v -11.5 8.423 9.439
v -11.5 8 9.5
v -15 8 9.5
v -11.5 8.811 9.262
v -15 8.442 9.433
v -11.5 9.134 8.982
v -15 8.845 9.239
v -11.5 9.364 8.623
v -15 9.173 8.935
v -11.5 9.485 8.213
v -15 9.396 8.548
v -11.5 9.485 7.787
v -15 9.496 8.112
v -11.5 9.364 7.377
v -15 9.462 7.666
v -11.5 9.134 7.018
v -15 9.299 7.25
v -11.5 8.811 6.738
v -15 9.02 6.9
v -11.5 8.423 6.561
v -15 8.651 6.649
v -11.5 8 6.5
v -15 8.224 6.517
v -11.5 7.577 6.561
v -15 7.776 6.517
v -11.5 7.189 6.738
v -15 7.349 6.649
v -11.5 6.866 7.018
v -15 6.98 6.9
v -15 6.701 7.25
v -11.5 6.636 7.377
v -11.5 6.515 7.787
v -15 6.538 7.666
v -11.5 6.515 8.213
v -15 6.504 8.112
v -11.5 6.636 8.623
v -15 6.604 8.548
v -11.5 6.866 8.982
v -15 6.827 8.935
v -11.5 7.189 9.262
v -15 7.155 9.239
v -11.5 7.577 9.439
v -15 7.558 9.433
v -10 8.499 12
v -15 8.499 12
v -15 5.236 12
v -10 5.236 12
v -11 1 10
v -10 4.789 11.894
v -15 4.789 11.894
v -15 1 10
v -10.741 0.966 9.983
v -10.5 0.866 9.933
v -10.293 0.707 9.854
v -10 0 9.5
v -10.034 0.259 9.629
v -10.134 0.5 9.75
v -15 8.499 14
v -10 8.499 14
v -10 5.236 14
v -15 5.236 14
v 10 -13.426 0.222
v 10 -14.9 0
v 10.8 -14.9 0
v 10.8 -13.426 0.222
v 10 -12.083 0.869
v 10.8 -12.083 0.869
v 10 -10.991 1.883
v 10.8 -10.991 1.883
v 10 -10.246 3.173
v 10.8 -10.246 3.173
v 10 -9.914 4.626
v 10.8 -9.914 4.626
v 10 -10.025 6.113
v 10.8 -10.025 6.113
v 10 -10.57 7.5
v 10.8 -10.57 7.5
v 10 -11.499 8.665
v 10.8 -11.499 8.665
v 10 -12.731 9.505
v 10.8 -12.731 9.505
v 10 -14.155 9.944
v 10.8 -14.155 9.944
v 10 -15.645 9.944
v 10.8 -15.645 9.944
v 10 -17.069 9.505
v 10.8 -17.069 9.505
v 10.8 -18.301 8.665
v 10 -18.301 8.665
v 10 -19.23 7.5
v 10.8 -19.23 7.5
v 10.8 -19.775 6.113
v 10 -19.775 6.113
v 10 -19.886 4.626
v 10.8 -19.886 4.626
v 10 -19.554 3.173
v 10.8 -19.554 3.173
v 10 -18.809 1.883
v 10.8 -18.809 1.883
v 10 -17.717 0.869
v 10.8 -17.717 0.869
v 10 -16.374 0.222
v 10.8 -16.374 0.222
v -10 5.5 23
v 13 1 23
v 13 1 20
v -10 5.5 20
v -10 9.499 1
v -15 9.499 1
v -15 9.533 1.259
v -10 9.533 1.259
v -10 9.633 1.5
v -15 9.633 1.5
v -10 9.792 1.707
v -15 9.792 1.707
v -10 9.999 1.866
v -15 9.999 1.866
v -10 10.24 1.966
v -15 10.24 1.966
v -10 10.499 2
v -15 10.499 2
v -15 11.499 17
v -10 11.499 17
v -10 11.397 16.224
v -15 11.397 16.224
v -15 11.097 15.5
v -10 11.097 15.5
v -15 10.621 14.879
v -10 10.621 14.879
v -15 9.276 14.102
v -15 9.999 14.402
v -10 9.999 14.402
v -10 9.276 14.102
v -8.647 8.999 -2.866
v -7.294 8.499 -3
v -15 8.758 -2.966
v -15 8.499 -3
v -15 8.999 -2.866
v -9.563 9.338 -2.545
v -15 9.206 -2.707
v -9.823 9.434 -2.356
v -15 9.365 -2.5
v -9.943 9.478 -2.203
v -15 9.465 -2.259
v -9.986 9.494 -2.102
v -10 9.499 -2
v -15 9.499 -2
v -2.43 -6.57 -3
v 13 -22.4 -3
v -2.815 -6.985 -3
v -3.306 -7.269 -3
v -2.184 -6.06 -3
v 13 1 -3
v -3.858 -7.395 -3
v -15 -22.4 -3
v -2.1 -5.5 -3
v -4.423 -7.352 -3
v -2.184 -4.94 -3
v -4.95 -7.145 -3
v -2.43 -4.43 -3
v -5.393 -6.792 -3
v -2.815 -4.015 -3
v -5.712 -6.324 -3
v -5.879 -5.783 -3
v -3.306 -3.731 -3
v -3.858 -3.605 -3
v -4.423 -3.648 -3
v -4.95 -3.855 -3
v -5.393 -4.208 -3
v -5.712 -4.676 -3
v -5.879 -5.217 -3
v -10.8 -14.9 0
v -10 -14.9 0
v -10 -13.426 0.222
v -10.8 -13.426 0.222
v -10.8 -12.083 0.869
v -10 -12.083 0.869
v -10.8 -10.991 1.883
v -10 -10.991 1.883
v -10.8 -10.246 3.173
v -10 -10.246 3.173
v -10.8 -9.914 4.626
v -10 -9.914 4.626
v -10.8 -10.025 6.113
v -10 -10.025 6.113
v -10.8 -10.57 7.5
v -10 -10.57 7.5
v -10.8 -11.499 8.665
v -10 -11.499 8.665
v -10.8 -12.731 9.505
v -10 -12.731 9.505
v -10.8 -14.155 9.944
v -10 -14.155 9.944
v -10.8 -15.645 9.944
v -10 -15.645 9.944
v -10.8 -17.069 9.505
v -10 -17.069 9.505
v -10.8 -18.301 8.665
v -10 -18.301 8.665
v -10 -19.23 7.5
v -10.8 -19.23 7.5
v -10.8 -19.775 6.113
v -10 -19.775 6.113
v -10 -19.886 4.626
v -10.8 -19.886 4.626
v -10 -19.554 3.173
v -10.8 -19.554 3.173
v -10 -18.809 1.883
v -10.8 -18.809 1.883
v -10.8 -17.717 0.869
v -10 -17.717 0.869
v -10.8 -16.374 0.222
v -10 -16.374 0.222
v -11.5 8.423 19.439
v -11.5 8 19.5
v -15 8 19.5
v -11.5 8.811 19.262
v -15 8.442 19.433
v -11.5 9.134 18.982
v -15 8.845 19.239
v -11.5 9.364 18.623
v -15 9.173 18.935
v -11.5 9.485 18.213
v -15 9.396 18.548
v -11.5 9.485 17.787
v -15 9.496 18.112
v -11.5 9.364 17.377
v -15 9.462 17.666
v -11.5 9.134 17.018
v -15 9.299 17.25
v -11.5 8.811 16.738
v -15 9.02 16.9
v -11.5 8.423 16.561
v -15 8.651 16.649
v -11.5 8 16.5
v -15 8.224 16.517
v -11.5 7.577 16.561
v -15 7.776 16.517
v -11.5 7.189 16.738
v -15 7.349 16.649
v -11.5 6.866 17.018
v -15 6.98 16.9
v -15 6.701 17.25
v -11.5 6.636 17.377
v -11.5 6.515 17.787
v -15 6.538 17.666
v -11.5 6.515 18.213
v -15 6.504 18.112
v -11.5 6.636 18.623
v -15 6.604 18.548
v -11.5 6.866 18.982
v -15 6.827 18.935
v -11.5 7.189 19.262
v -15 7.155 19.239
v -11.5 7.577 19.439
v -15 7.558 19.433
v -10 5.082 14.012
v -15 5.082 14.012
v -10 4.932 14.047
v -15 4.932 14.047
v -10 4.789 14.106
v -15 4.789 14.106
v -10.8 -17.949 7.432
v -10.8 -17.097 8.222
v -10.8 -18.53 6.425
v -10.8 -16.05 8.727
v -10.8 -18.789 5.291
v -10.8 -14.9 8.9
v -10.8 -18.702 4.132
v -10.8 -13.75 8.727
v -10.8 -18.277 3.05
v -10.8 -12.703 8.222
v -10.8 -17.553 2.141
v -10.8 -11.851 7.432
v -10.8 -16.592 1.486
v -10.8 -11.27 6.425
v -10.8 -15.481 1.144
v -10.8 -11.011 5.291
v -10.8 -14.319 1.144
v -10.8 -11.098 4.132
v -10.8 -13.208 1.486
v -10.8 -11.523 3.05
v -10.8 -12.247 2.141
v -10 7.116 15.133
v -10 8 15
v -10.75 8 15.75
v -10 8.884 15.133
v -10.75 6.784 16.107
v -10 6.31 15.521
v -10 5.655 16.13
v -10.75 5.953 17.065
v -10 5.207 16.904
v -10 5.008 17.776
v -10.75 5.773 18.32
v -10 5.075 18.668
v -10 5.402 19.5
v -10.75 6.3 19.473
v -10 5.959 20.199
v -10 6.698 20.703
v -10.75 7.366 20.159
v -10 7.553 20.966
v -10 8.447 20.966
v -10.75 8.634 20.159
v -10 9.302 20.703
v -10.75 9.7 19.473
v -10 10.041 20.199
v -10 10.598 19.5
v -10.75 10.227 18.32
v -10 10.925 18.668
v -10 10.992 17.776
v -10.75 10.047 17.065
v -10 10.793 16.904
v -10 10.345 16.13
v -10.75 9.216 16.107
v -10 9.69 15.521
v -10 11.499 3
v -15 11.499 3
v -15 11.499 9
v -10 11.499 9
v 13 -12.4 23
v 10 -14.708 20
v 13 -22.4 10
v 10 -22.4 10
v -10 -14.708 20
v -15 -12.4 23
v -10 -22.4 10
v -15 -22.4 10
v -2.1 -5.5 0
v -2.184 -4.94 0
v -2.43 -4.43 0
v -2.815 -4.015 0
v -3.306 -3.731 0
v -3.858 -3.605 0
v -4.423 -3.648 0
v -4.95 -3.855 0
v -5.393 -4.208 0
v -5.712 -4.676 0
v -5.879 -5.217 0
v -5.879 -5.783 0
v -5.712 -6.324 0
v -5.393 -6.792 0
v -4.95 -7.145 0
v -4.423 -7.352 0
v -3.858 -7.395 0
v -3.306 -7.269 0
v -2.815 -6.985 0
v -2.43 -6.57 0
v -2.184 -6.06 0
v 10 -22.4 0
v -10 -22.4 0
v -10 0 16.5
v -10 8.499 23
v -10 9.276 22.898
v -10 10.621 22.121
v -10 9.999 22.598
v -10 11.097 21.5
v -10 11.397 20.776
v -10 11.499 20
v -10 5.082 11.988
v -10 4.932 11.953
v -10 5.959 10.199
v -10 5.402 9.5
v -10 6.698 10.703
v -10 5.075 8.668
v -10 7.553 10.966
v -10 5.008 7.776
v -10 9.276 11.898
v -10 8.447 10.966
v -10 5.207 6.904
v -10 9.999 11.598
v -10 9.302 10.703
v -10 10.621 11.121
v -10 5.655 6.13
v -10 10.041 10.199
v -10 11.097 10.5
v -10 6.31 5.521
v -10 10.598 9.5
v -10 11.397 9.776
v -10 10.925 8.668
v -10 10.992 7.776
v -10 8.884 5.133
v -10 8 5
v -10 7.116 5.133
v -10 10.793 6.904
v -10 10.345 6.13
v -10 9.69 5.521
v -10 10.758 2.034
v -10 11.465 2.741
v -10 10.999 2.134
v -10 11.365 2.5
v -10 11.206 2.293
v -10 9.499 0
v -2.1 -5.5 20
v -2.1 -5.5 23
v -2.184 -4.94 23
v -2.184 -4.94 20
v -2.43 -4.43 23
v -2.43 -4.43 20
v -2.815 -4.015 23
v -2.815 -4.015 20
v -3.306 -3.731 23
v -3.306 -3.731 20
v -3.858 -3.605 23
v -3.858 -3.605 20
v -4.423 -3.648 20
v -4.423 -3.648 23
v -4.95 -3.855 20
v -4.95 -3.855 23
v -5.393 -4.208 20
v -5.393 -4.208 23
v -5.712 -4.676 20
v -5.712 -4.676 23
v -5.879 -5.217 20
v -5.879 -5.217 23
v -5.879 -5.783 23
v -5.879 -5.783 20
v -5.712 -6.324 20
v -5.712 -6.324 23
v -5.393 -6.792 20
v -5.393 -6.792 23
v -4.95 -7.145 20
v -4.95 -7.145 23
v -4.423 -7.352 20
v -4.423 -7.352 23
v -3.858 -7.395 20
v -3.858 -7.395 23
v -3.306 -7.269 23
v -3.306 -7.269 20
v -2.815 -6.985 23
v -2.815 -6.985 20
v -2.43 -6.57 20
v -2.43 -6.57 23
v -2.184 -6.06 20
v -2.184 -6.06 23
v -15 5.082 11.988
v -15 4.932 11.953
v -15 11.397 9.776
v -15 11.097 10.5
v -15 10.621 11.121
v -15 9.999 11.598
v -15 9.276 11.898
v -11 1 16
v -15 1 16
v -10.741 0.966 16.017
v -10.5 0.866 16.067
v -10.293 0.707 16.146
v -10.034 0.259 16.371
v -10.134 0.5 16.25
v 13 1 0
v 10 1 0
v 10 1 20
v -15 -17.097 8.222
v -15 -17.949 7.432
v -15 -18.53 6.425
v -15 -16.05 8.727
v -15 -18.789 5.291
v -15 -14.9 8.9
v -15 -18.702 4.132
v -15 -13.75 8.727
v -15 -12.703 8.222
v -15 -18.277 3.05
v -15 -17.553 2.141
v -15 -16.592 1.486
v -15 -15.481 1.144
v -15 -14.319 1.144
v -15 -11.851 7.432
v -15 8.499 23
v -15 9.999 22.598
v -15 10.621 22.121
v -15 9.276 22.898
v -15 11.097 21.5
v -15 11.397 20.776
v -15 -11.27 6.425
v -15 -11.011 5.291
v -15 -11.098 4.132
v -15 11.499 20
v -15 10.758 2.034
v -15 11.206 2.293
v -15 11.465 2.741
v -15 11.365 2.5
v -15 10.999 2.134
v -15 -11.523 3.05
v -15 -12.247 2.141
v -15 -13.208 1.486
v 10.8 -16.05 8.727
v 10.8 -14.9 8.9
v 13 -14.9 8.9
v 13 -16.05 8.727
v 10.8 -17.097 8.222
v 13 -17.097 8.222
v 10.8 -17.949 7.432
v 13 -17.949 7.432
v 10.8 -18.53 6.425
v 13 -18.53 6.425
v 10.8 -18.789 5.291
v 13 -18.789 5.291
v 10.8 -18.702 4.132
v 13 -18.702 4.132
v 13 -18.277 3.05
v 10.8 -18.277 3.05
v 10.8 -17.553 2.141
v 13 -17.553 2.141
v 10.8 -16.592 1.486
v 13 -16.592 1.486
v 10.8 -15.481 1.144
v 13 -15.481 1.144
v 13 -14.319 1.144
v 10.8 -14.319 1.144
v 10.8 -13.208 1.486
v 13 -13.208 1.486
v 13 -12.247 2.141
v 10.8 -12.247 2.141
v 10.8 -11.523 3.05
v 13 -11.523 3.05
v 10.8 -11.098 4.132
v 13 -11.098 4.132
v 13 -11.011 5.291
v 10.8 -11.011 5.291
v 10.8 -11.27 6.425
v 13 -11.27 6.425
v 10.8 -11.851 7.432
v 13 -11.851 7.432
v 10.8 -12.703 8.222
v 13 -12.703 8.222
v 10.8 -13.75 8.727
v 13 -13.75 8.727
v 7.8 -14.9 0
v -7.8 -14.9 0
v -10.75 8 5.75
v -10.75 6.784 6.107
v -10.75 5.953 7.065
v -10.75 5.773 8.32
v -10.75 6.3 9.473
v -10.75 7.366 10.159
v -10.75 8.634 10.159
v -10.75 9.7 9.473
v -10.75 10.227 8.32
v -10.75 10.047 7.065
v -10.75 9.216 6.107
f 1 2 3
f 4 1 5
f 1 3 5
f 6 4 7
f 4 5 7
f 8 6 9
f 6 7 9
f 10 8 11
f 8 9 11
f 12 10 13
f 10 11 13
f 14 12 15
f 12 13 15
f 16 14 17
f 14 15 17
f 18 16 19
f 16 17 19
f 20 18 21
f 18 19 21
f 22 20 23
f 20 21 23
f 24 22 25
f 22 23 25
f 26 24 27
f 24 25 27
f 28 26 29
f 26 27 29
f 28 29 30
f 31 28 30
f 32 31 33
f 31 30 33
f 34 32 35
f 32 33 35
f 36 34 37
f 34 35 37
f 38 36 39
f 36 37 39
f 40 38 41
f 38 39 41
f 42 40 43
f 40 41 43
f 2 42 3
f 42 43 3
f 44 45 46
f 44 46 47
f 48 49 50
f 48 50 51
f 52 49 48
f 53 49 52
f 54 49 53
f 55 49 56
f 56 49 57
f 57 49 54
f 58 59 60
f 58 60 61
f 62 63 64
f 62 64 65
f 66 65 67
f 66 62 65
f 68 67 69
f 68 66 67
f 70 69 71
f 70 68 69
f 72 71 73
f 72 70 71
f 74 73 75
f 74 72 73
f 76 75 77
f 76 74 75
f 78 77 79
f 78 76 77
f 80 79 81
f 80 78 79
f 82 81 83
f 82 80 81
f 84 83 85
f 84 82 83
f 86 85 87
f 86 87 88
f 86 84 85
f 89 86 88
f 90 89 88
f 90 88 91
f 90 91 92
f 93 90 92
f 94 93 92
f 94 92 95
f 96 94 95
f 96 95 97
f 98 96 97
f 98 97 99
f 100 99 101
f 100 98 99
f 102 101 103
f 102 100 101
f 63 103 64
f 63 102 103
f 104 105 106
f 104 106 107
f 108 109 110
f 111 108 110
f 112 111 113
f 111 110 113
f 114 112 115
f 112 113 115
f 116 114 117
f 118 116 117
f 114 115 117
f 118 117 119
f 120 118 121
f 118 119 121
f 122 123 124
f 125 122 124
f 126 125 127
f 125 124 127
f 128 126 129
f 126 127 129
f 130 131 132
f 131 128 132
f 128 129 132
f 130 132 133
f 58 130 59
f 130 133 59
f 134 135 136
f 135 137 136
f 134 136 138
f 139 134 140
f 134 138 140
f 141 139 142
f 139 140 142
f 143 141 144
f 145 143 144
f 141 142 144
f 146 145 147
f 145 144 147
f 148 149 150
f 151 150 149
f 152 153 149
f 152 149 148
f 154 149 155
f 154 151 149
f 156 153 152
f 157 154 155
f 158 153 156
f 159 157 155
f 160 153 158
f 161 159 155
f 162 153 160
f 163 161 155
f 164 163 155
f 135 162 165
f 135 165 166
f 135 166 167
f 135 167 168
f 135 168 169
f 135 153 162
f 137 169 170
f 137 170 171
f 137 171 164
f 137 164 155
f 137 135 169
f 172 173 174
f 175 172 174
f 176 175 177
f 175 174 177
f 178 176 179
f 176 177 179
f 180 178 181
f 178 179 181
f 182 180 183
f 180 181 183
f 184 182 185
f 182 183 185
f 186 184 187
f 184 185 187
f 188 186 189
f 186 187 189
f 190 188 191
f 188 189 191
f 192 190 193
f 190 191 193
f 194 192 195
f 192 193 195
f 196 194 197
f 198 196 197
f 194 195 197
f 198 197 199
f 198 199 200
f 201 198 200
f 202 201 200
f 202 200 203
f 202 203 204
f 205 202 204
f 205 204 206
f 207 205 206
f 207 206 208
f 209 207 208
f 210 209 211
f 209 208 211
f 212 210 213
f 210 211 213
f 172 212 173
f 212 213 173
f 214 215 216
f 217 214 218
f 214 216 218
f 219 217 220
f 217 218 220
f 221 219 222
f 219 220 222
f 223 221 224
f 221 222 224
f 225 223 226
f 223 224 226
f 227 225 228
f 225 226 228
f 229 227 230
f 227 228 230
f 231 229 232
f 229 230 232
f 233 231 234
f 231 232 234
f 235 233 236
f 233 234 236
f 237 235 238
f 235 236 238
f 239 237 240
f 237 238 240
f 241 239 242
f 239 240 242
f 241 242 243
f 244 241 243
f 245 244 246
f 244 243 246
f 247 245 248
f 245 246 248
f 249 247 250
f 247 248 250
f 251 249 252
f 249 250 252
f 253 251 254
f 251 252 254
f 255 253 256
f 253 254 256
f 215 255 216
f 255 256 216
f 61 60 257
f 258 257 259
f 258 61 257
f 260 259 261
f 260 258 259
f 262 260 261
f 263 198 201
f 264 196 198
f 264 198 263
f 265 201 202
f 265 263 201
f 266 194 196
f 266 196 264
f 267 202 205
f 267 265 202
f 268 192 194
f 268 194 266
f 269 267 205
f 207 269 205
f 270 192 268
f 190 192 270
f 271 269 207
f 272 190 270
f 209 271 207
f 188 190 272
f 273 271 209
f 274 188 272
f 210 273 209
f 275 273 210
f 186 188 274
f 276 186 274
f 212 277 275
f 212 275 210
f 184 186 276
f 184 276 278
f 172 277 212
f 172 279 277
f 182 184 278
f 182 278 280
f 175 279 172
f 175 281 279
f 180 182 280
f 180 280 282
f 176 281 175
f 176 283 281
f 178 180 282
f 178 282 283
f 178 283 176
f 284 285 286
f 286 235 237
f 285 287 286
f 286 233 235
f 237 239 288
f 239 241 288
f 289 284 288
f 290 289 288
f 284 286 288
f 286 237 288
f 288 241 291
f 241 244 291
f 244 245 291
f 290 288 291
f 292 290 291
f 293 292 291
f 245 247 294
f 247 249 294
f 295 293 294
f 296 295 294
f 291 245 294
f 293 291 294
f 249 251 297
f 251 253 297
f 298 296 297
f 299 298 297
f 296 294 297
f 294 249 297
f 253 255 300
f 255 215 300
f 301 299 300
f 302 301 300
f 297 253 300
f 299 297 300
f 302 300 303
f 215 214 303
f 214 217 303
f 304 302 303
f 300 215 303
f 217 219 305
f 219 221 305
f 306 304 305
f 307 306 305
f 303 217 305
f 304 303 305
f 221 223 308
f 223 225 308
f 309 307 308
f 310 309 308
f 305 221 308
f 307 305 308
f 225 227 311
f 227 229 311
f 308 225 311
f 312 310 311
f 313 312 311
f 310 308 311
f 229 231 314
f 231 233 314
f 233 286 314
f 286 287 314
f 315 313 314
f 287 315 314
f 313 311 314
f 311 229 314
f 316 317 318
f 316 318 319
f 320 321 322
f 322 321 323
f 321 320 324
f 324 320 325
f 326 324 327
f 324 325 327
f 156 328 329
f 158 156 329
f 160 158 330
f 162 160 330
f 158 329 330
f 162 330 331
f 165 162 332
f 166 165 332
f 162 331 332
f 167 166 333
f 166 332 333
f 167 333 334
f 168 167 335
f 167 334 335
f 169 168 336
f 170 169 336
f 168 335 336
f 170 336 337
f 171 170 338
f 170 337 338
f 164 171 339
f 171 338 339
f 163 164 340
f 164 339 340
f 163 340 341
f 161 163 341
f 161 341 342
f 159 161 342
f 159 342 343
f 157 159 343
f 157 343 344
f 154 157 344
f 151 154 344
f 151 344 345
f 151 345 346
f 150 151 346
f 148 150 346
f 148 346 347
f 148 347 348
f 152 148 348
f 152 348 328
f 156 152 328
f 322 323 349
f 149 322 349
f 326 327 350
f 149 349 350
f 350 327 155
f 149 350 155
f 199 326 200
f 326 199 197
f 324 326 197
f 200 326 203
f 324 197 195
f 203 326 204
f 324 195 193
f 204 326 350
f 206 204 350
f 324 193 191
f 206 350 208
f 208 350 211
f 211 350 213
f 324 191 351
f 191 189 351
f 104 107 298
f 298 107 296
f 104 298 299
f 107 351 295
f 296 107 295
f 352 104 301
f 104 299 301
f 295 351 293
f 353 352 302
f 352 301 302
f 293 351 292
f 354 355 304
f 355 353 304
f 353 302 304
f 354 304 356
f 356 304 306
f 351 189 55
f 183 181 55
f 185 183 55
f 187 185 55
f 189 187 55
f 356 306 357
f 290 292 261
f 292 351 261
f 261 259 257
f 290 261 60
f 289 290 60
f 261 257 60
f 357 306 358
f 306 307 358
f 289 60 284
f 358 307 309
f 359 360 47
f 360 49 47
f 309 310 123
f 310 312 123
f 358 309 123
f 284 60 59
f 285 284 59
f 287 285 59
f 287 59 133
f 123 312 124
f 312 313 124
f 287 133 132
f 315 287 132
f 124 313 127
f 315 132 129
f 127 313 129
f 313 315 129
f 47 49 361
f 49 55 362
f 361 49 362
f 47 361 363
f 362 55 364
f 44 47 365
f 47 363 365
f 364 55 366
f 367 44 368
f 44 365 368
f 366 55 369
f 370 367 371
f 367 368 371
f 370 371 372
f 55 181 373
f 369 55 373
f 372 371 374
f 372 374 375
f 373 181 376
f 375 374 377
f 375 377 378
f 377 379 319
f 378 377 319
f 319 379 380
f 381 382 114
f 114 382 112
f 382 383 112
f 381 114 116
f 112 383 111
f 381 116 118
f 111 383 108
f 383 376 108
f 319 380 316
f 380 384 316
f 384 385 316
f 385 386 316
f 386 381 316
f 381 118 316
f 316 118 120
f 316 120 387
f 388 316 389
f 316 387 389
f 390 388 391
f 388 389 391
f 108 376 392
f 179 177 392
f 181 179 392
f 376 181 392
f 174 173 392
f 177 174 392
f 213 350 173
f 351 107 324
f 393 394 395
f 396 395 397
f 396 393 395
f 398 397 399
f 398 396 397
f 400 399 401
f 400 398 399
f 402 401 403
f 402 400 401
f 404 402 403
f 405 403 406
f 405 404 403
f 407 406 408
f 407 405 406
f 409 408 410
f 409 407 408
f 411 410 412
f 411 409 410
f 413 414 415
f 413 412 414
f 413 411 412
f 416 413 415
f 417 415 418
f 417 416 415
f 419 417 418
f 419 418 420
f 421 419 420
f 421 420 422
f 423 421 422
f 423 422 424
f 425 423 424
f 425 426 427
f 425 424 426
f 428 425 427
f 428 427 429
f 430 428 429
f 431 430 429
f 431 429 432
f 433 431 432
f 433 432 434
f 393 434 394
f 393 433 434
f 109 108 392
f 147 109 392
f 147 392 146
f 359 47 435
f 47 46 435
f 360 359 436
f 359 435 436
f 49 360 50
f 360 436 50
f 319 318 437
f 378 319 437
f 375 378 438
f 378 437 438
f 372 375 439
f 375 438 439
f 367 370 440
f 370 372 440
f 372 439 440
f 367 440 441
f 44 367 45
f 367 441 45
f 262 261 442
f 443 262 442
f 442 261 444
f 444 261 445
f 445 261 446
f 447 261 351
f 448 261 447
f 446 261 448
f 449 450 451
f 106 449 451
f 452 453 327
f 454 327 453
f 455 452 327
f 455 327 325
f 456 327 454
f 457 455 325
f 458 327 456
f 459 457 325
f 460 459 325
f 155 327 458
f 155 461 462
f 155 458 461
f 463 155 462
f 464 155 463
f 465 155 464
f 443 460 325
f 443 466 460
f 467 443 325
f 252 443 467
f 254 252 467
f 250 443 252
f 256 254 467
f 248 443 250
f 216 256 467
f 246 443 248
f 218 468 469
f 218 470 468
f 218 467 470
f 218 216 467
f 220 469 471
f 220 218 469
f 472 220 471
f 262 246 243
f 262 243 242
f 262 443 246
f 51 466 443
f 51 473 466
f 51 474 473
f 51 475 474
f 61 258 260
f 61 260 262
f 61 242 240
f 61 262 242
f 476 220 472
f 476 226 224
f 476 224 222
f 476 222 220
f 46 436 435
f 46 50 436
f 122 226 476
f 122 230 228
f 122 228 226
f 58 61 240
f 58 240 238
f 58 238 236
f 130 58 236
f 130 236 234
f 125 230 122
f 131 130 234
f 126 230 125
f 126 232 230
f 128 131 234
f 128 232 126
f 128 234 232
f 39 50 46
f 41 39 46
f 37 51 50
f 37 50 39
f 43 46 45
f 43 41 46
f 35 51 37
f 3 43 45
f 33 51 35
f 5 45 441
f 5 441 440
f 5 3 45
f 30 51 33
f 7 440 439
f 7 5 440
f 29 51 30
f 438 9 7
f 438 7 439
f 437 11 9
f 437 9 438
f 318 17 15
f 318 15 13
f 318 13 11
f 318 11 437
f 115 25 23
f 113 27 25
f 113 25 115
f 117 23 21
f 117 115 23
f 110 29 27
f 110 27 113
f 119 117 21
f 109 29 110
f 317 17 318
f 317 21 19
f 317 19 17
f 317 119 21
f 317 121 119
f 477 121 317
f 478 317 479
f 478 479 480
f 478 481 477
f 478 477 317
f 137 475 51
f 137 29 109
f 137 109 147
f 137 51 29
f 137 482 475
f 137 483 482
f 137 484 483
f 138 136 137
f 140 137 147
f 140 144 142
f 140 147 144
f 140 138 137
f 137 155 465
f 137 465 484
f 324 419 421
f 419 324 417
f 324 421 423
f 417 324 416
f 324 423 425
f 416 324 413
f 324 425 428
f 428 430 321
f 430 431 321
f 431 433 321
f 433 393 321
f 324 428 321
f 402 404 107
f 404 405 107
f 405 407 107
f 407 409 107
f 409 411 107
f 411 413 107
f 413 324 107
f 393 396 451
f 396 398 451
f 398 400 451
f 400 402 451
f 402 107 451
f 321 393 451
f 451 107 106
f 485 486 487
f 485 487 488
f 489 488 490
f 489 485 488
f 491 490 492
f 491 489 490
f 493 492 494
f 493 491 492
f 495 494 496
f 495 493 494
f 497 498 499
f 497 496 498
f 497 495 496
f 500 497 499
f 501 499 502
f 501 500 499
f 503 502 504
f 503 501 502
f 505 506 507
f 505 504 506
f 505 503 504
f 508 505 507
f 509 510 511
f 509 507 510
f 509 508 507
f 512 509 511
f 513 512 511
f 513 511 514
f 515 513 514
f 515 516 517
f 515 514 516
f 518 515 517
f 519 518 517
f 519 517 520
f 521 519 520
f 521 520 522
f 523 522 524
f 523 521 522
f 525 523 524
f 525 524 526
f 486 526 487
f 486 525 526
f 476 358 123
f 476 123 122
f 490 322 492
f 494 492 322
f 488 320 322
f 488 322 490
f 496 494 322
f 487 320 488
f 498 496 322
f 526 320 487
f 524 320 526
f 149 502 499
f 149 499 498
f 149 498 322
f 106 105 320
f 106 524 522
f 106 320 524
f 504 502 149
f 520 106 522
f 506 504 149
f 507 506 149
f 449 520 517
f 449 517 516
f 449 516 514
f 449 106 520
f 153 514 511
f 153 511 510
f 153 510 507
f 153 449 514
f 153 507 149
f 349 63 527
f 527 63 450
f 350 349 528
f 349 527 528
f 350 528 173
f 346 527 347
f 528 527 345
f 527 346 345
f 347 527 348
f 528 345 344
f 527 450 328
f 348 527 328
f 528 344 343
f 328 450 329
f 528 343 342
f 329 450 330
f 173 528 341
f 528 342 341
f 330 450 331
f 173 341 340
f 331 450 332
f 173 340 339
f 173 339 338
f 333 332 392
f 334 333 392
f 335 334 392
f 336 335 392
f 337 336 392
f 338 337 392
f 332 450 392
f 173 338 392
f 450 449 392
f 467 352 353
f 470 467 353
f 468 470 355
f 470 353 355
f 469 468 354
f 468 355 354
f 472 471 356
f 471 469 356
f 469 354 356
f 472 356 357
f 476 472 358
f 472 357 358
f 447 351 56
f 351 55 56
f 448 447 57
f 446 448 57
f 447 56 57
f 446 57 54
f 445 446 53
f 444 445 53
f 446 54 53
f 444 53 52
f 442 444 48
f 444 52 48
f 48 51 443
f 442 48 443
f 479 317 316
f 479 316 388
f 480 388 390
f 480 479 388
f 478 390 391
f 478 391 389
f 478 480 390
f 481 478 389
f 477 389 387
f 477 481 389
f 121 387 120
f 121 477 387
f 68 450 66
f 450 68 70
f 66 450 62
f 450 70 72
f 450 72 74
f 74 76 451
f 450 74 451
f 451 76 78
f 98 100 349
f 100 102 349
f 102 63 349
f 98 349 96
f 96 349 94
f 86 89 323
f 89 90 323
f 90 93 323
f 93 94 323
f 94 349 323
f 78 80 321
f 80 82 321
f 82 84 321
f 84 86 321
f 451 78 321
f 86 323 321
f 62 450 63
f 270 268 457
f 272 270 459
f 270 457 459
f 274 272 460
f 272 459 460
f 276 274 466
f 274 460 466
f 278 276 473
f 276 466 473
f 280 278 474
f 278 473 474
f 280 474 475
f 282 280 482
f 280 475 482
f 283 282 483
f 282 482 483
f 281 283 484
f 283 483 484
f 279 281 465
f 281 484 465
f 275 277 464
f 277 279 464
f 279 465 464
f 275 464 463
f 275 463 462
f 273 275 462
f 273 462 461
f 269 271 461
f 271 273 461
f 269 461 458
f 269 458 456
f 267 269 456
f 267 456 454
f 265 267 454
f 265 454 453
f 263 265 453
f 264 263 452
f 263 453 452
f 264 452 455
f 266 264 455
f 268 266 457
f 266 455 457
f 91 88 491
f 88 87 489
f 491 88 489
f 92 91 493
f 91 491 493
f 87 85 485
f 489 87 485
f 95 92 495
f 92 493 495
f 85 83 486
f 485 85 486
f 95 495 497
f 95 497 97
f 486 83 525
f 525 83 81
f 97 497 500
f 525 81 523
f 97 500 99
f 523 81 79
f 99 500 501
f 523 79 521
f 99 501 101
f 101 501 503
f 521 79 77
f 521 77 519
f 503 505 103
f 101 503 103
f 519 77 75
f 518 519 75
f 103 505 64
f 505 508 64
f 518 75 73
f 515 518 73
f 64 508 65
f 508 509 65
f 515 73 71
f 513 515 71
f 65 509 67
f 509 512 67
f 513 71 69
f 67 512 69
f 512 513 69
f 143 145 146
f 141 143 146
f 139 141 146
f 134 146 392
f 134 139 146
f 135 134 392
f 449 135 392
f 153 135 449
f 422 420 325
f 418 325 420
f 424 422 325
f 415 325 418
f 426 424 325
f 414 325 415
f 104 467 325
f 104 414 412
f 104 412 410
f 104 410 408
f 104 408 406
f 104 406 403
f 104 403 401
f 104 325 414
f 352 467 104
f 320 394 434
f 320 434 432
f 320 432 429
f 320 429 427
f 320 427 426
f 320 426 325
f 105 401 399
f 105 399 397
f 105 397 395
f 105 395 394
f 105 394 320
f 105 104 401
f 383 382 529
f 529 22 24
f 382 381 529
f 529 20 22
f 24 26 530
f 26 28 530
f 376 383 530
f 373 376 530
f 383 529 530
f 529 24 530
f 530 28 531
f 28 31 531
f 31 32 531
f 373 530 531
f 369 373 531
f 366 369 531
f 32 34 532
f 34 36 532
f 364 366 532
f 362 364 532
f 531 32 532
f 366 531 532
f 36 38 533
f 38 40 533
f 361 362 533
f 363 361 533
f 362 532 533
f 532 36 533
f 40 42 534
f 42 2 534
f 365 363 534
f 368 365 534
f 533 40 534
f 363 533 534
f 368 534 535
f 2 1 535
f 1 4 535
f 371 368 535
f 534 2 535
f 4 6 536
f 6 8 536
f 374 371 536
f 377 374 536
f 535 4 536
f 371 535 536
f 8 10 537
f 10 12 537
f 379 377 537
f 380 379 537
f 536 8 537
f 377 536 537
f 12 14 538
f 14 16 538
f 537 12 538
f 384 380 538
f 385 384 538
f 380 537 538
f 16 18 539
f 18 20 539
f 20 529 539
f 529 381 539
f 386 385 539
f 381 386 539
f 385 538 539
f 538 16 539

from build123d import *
from build123d.topology import SkipClean

# Parameters (mm, degrees)
SKETCH_1_W                = 20
SKETCH_1_H                = 57.76596942167697
EXTRUDE_1_DEPTH           = 3
EXTRUDE_2_DEPTH           = 3
CUT_EXTRUDE_1_DEPTH       = 6
SKETCH_8_R                = 4.48
CUT_EXTRUDE_2_DEPTH       = 0.8
SKETCH_9_R                = 1.9
CUT_EXTRUDE_3_DEPTH       = 3.8
SKETCH_12_W               = 26.000000000000007
SKETCH_12_H               = 35.36596942167698
CUT_EXTRUDE_4_DEPTH       = 36.00000000000001
CUT_EXTRUDE_8_DEPTH       = 28.00000000000001
SKETCH_23_W               = 26.000000000000004
SKETCH_23_H               = 26
SKETCH_23_W_2             = 20
SKETCH_23_H_2             = 19.999999999999993
EXTRUDE_7_DEPTH           = 4
SKETCH_24_W               = 20
SKETCH_24_H               = 19.999999999999993
EXTRUDE_8_DEPTH           = 3
SKETCH_25_W               = 5.000000000000002
SKETCH_25_H               = 16
SKETCH_25_R               = 1.4999999999999991
EXTRUDE_9_DEPTH           = 3
FILLET_1_R                = 1
CUT_EXTRUDE_9_DEPTH       = 3
SKETCH_27_R               = 1.4999999999999987
CUT_EXTRUDE_10_DEPTH      = 3
SKETCH_28_W               = 20
SKETCH_28_H               = 19.999999999999993
CUT_EXTRUDE_11_DEPTH      = 10
CUT_EXTRUDE_12_DEPTH      = 42.00000000000001
SKETCH_31_R               = 4.48
SKETCH_31_R_2             = 3.98
EXTRUDE_13_DEPTH          = 0.8
SKETCH_32_R               = 5.000000000000001
SKETCH_32_R_2             = 3.98
CUT_EXTRUDE_13_DEPTH      = 0.8
SKETCH_33_R               = 4.48
EXTRUDE_14_DEPTH          = 3
SKETCH_36_R               = 5.000000000000001
CUT_EXTRUDE_14_DEPTH      = 3
SKETCH_37_R               = 3.98
SKETCH_37_R_2             = 3.900000000000001
EXTRUDE_17_DEPTH          = 0.8
SKETCH_38_R               = 1.5000000000000009
EXTRUDE_18_DEPTH          = 3
SKETCH_39_W               = 4.187599959799879
SKETCH_39_H               = 1.3608825238343043
EXTRUDE_19_DEPTH          = 3
EXTRUDE_START             = 2
SKETCH_43_R               = 1.5000000000000024
SKETCH_43_R_2             = 1.5000000000000009
SKETCH_43_R_3             = 3.900000000000002
EXTRUDE_22_DEPTH          = 2
SKETCH_44_W               = 5
SKETCH_44_H               = 9.399224841629362
EXTRUDE_23_DEPTH          = 2
EXTRUDE_24_DEPTH          = 3
SKETCH_47_W               = 5
SKETCH_47_H               = 9.399224841629362
EXTRUDE_25_DEPTH          = 8
SKETCH_51_W               = 5
SKETCH_51_H               = 14
SKETCH_51_H_2             = 7.999999999999998
EXTRUDE_28_DEPTH          = 1.1
CUT_EXTRUDE_16_DEPTH      = 6.1000000000000005
FILLET_START              = -16
FILLET_9_DEPTH            = 7
FILLET_START_2            = -15
FILLET_9_2_DEPTH          = 5
EXTRUDE_30_DEPTH          = 3
FILLET_10_R               = 1
SKETCH_57_W               = 5
SKETCH_57_H               = 10.499224841629362
EXTRUDE_31_DEPTH          = 1
SKETCH_58_W               = 5
SKETCH_58_H               = 10.499224841629362
EXTRUDE_32_DEPTH          = 1
FILLET_11_R               = 3
CUT_EXTRUDE_19_DEPTH      = 6.500000000000001
FILLET_14_R               = 1
FILLET_19_R               = 1
HOLE_WIZARD_1_D           = 3
HOLE_WIZARD_1_DEPTH       = 5
HOLE_WIZARD_1_CSINK_D     = 6
HOLE_WIZARD_1_CSINK_ANGLE = 90


with BuildPart() as part:
    # 草图1 → 凸台-拉伸1 (new body)
    with BuildSketch(Plane.XY):
        with Locations((0, -28.882984710838485)):
            Rectangle(SKETCH_1_W, SKETCH_1_H)
    extrude_1 = extrude(amount=-EXTRUDE_1_DEPTH)

    # 草图2 → 凸台-拉伸2 (add)
    with BuildSketch(Plane.ZY.offset(10)):
        Polygon((-3, -1.22e-15), (23, 0), (23.000000000000007, -57.76596942167697), (-3, -57.76596942167697), align=None)
    extrude_2 = extrude(amount=EXTRUDE_2_DEPTH)

    # 草图7 → 切除-拉伸1 (cut)
    with BuildSketch(Plane(origin=(-10, 0, 0), x_dir=(0, 0, -1), z_dir=(1, 0, 0))):
        with BuildLine():
            ThreePointArc((-1.0999999999999996, -14.899999999999997), (-5, -10.999999999999996), (-8.9, -14.899999999999997))
            Line((-8.9, -14.899999999999997), (-1.1000000000000014, -14.899999999999997))
        make_face()
        with BuildLine():
            Line((-1.1000000000000014, -14.899999999999997), (-8.9, -14.899999999999997))
            ThreePointArc((-8.9, -14.899999999999997), (-5.000000000000001, -18.799999999999997), (-1.0999999999999996, -14.899999999999999))
        make_face()
    cut_extrude_1 = extrude(amount=-CUT_EXTRUDE_1_DEPTH, mode=Mode.SUBTRACT)

    # 草图8 → 切除-拉伸2 (cut)
    with BuildSketch(Plane.ZY.offset(13.000000000000002)):
        with Locations((5, -14.899999999999997)):
            Circle(SKETCH_8_R)
    cut_extrude_2 = extrude(amount=-CUT_EXTRUDE_2_DEPTH, mode=Mode.SUBTRACT)

    # 草图9 → 切除-拉伸3 (cut)
    with BuildSketch(Plane.XY):
        with Locations((-4, -5.499999999999998)):
            Circle(SKETCH_9_R)
    cut_extrude_3 = extrude(amount=-CUT_EXTRUDE_3_DEPTH, mode=Mode.SUBTRACT)

    # 镜向1: 凸台-拉伸2 across plane
    add(extrude_2.mirror(Plane(origin=(0, 0, 0), x_dir=(0, 0, 1), z_dir=(1, 0, 0))))

    # 镜向2: 切除-拉伸1, 切除-拉伸2 across plane
    add(cut_extrude_1.mirror(Plane(origin=(0, 0, 0), x_dir=(0, 0, 1), z_dir=(1, 0, 0))), mode=Mode.SUBTRACT)
    add(cut_extrude_2.mirror(Plane(origin=(0, 0, 0), x_dir=(0, 0, 1), z_dir=(1, 0, 0))), mode=Mode.SUBTRACT)

    # 镜向3: 凸台-拉伸1 across plane
    add(extrude_1.mirror(Plane.XY.offset(10)))

    # 镜向5: 切除-拉伸3 across plane
    add(cut_extrude_3.mirror(Plane.XY.offset(10)), mode=Mode.SUBTRACT)

    # 草图12 → 切除-拉伸4 (cut)
    with BuildSketch(Plane(origin=(13.000000000000002, 0, 0), x_dir=(0, 0, -1), z_dir=(1, 0, 0))):
        with Locations((-10.000000000000004, -40.08298471083848)):
            Rectangle(SKETCH_12_W, SKETCH_12_H)
    extrude(amount=-CUT_EXTRUDE_4_DEPTH, mode=Mode.SUBTRACT)

    # 草图22 → 切除-拉伸8 (cut)
    with BuildSketch(Plane(origin=(13.000000000000002, 0, 0), x_dir=(0, 0, -1), z_dir=(1, 0, 0))):
        Polygon((-23.000000000000007, -12.399999999999997), (-23.000000000000007, -22.399999999999995), (-10.000000000000007, -22.399999999999995), align=None)
    extrude(amount=-CUT_EXTRUDE_8_DEPTH, mode=Mode.SUBTRACT)

    # 草图23 → 凸台-拉伸7 (add)
    with BuildSketch(Plane(origin=(0, 0, 0), x_dir=(1, 0, 0), z_dir=(0, 1, 0))):
        with Locations((0, -10)):
            Rectangle(SKETCH_23_W, SKETCH_23_H)
        with Locations((0, -9.999999999999996)):
            Rectangle(SKETCH_23_W_2, SKETCH_23_H_2, mode=Mode.SUBTRACT)
    extrude(amount=EXTRUDE_7_DEPTH)

    # 草图24 → 凸台-拉伸8 (add)
    with BuildSketch(Plane(origin=(0, 4, 0), x_dir=(1, 0, 0), z_dir=(0, 1, 0))):
        with Locations((0, -9.999999999999996)):
            Rectangle(SKETCH_24_W, SKETCH_24_H)
    extrude(amount=-EXTRUDE_8_DEPTH)

    # 草图25 → 凸台-拉伸9 (add)
    with BuildSketch(Plane(origin=(0, 4, 0), x_dir=(1, 0, 0), z_dir=(0, 1, 0))):
        with Locations((15.500000000000004, -15)):
            Rectangle(SKETCH_25_W, SKETCH_25_H)
        with Locations(Location((15.500000000000002, -20.23329325648959, 0), (0, 0, 270))):
            Circle(SKETCH_25_R, mode=Mode.SUBTRACT)
        with Locations(Location((15.500000000000002, -10.23329325648959, 0), (0, 0, 270))):
            Circle(SKETCH_25_R, mode=Mode.SUBTRACT)
    extrude(amount=-EXTRUDE_9_DEPTH)

    # 圆角1
    fillet_1_edges = [part.edges().sort_by_distance(p)[0] for p in [
        (18.000000000000004, 1, 15),
    ]]
    fillet(fillet_1_edges, radius=FILLET_1_R)

    # 草图26 → 切除-拉伸9 (cut)
    with BuildSketch(Plane(origin=(13.000000000000002, 0, 0), x_dir=(0, 0, -1), z_dir=(1, 0, 0))):
        with BuildLine():
            Line((-16, 1.0000000000000004), (-13.999999999999998, 1.0000000000000004))
            ThreePointArc((-13.999999999999998, 1.0000000000000004), (-15, 0), (-16, 1.0000000000000004))
        make_face()
    extrude(amount=-CUT_EXTRUDE_9_DEPTH, mode=Mode.SUBTRACT)

    # 草图27 → 切除-拉伸10 (cut)
    with BuildSketch(Plane(origin=(0, 4, 0), x_dir=(1, 0, 0), z_dir=(0, 1, 0))):
        with Locations(Location((7.500000000000002, -15.233293256489592, 0), (0, 0, 270))):
            Circle(SKETCH_27_R)
    extrude(amount=-CUT_EXTRUDE_10_DEPTH, mode=Mode.SUBTRACT)

    # 草图28 → 切除-拉伸11 (cut)
    with BuildSketch(Plane.XZ.offset(-1)):
        with Locations((0, 9.999999999999996)):
            Rectangle(SKETCH_28_W, SKETCH_28_H)
    extrude(amount=-CUT_EXTRUDE_11_DEPTH, mode=Mode.SUBTRACT)

    # 草图29 → 切除-拉伸12 (cut)
    with BuildSketch(Plane(origin=(0, 0, -3), x_dir=(-1, 0, 0), z_dir=(0, 0, -1))):
        Polygon((13.000000000000002, 4), (-24.68163228941081, 4), (-24.68163228941081, 0.9999999999999957), (13.000000000000002, 1.0000000000000002), align=None)
    extrude(amount=-CUT_EXTRUDE_12_DEPTH, mode=Mode.SUBTRACT)

    # 草图31 → 凸台-拉伸13 (add)
    with BuildSketch(Plane.ZY.offset(12.200000000000001)):
        with Locations((5, -14.899999999999997)):
            Circle(SKETCH_31_R)
        with Locations((5, -14.899999999999997)):
            Circle(SKETCH_31_R_2, mode=Mode.SUBTRACT)
    extrude(amount=EXTRUDE_13_DEPTH)

    # 草图32 → 切除-拉伸13 (cut)
    with BuildSketch(Plane(origin=(-10, 0, 0), x_dir=(0, 0, -1), z_dir=(1, 0, 0))):
        with Locations((-5, -14.899999999999997)):
            Circle(SKETCH_32_R)
        with Locations(Location((-5, -14.899999999999997, 0), (0, 0, 180))):
            Circle(SKETCH_32_R_2, mode=Mode.SUBTRACT)
    cut_extrude_13 = extrude(amount=-CUT_EXTRUDE_13_DEPTH, mode=Mode.SUBTRACT)

    # 草图33 → 凸台-拉伸14 (add)
    with BuildSketch(Plane(origin=(13.000000000000002, 0, 0), x_dir=(0, 0, -1), z_dir=(1, 0, 0))):
        with Locations((-5, -14.899999999999997)):
            Circle(SKETCH_33_R)
    extrude(amount=-EXTRUDE_14_DEPTH)

    # 镜向6: 切除-拉伸1, 切除-拉伸13 across plane
    add(cut_extrude_1.mirror(Plane(origin=(0, 0, 0), x_dir=(0, 0, 1), z_dir=(1, 0, 0))), mode=Mode.SUBTRACT)
    add(cut_extrude_13.mirror(Plane(origin=(0, 0, 0), x_dir=(0, 0, 1), z_dir=(1, 0, 0))), mode=Mode.SUBTRACT)

    # 草图36 → 切除-拉伸14 (cut)
    with BuildSketch(Plane(origin=(-10.8, 0, 0), x_dir=(0, 0, -1), z_dir=(1, 0, 0))):
        with Locations((-5, -14.899999999999997)):
            Circle(SKETCH_36_R)
    cut_extrude_14 = extrude(amount=CUT_EXTRUDE_14_DEPTH, mode=Mode.SUBTRACT)

    # 镜向7: 切除-拉伸14 across plane
    add(cut_extrude_14.mirror(Plane(origin=(0, 0, 0), x_dir=(0, 0, 1), z_dir=(1, 0, 0))), mode=Mode.SUBTRACT)

    # 草图37 → 凸台-拉伸17 (add)
    with SkipClean():  # the faces are left unmerged after this step: merging them gives an invalid solid
        with BuildSketch(Plane.ZY.offset(12.200000000000001)):
            with Locations((5, -14.899999999999997)):
                Circle(SKETCH_37_R)
            with Locations((5, -14.899999999999997)):
                Circle(SKETCH_37_R_2, mode=Mode.SUBTRACT)
        extrude(amount=EXTRUDE_17_DEPTH)

    # 草图38 → 凸台-拉伸18 (add)
    # profile 1 of 2: a face of its own
    with SkipClean():  # the faces are left unmerged after this step: merging them gives an invalid solid
        with BuildSketch(Plane.ZY.offset(13.000000000000002)):
            Polygon((15, 10.399224841629362), (15, 1), (20.999999999999996, 1.0000000000000002), (20.999999999999996, 10.399224841629362), align=None)
            with Locations((18, 8)):
                Circle(SKETCH_38_R, mode=Mode.SUBTRACT)
        # profile 2 of 2: a face of its own
        with BuildSketch(Plane.ZY.offset(13.000000000000002)):
            Polygon((11, 1), (11, 10.399224841629362), (5.000000000000001, 10.399224841629362), (5.000000000000001, 1.0000000000000002), align=None)
            with Locations((8, 8)):
                Circle(SKETCH_38_R, mode=Mode.SUBTRACT)
        extrude(amount=-EXTRUDE_18_DEPTH)

    # 草图39 → 凸台-拉伸19 (add)
    with SkipClean():  # the faces are left unmerged after this step: merging them gives an invalid solid
        with BuildSketch(Plane(origin=(13.000000000000002, 0, 0), x_dir=(0, 0, -1), z_dir=(1, 0, 0))):
            with Locations((-15.28799119011226, 0.3195587380828476)):
                Rectangle(SKETCH_39_W, SKETCH_39_H)
        extrude(amount=-EXTRUDE_19_DEPTH)

    # 草图43 → 凸台-拉伸22 (add)
    with BuildSketch(Plane.ZY.offset(13.000000000000002).offset(EXTRUDE_START)):
        Polygon((-3, 1.0000000000000002), (5.000000000000004, 1.0000000000000002), (5.000000000000001, 10.399224841629362), (11, 10.399224841629362), (11, 1.0000000000000002), (15, 1.0000000000000002), (15, 10.399224841629362), (20.999999999999996, 10.399224841629362), (20.999999999999996, 1.0000000000000002), (23.000000000000007, 1.0000000000000002), (23.000000000000007, -12.399999999999997), (10.000000000000009, -22.399999999999995), (-3, -22.399999999999995), align=None)
        with Locations((8, 8)):
            Circle(SKETCH_43_R, mode=Mode.SUBTRACT)
        with Locations((18, 8)):
            Circle(SKETCH_43_R_2, mode=Mode.SUBTRACT)
        with Locations((5, -14.899999999999997)):
            Circle(SKETCH_43_R_3, mode=Mode.SUBTRACT)
    extrude(amount=-EXTRUDE_22_DEPTH)

    # 草图44 → 凸台-拉伸23 (add)
    with BuildSketch(Plane.XY.offset(20.999999999999996)):
        with Locations((-12.500000000000002, 5.699612420814681)):
            Rectangle(SKETCH_44_W, SKETCH_44_H)
    extrude(amount=EXTRUDE_23_DEPTH)

    # 草图45 → 凸台-拉伸24 (add)
    with BuildSketch(Plane.XY.offset(23)):
        Polygon((-10.000000000000002, 0.9999999999999981), (13.000000000000002, 0.9999999999999943), (-10.000000000000002, 5.499999999999998), align=None)
    extrude(amount=-EXTRUDE_24_DEPTH)

    # 草图47 → 凸台-拉伸25 (add)
    with BuildSketch(Plane(origin=(0, 0, 5.000000000000001), x_dir=(-1, 0, 0), z_dir=(0, 0, -1))):
        with Locations((12.500000000000002, 5.699612420814681)):
            Rectangle(SKETCH_47_W, SKETCH_47_H)
    extrude(amount=EXTRUDE_25_DEPTH)

    # 草图51 → 凸台-拉伸28 (add)
    with BuildSketch(Plane(origin=(0, 10.399224841629362, 0), x_dir=(1, 0, 0), z_dir=(0, 1, 0))):
        with Locations((-12.500000000000002, -4)):
            Rectangle(SKETCH_51_W, SKETCH_51_H)
        with Locations((-12.500000000000002, -19)):
            Rectangle(SKETCH_51_W, SKETCH_51_H_2)
    extrude(amount=EXTRUDE_28_DEPTH)

    # 草图53 → 切除-拉伸16 (cut)
    with BuildSketch(Plane(origin=(-10, 0, 0), x_dir=(0, 0, -1), z_dir=(1, 0, 0))):
        Polygon((2.999999999999999, 11.499224841629362), (-2.000000000000001, 11.499224841629362), (-2.0000000000000004, 9.49922484162936), (2.999999999999999, 9.499224841629362), align=None)
    extrude(amount=-CUT_EXTRUDE_16_DEPTH, mode=Mode.SUBTRACT)

    # 圆角9: read off the stored shape, not the designer's step
    # 圆角9 outline → 圆角9 (cut)
    with BuildSketch(Plane.YZ.offset(FILLET_START)):
        with BuildLine():
            Line((11.499224842, 2), (11.499224842, 3))
            ThreePointArc((11.499224842, 3), (11.206331623, 2.292893219), (10.499224842, 2))
            Line((10.499224842, 2), (11.499224842, 2))
        make_face()
    extrude(amount=FILLET_9_DEPTH, mode=Mode.SUBTRACT)

    # Fillet 9 2 outline → Fillet 9 2 (add)
    with BuildSketch(Plane.YZ.offset(FILLET_START_2)):
        with BuildLine():
            ThreePointArc((9.499224842, 1), (9.79211806, 1.707106782), (10.499224842, 2))
            Line((10.499224842, 2), (9.499224842, 2))
            Line((9.499224842, 2), (9.499224842, 1))
        make_face()
    extrude(amount=FILLET_9_2_DEPTH)

    # 草图54 → 凸台-拉伸30 (add)
    with BuildSketch(Plane(origin=(0, 0, -3), x_dir=(-1, 0, 0), z_dir=(0, 0, -1))):
        Polygon((-13.000000000000002, 0.9999999999999972), (10.000000000000002, 1.0000000000000002), (10, 9.499224841629362), align=None)
    extrude(amount=-EXTRUDE_30_DEPTH)

    # 圆角10
    fillet_10_edges = [part.edges().sort_by_distance(p)[0] for p in [
        (-12.5, 9.499224841629362, -2.999999999999999),
    ]]
    fillet(fillet_10_edges, radius=FILLET_10_R)

    # 草图57 → 凸台-拉伸31 (add)
    with BuildSketch(Plane(origin=(0, 0, 15), x_dir=(-1, 0, 0), z_dir=(0, 0, -1))):
        with Locations((12.500000000000002, 6.249612420814681)):
            Rectangle(SKETCH_57_W, SKETCH_57_H)
    extrude(amount=EXTRUDE_31_DEPTH)

    # 草图58 → 凸台-拉伸32 (add)
    with BuildSketch(Plane.XY.offset(11)):
        with Locations((-12.500000000000002, 6.249612420814681)):
            Rectangle(SKETCH_58_W, SKETCH_58_H)
    extrude(amount=EXTRUDE_32_DEPTH)

    # 圆角11
    # the kernel refuses this fillet: 3 mm, written as the material it takes off along each edge
    with BuildSketch(Plane(origin=(-2.5000000000000018, 11.499224841629362, 23), x_dir=(0, -1, 0), z_dir=(-1, 0, 0)), Plane(origin=(-2.5000000000000018, 11.499224841629362, 14), x_dir=(0, 0, 1), z_dir=(-1, 0, 0))) as fillet_11_piece_1:
        with BuildLine():
            CenterArc((FILLET_11_R, -FILLET_11_R), FILLET_11_R, 90, 90)
            Line((0, -FILLET_11_R), (0, 0))
            Line((0, 0), (FILLET_11_R, 0))
        make_face()
    extrude(amount=20, mode=Mode.SUBTRACT)
    with BuildSketch(Plane(origin=(-22.5, 11.499224841629362, 12), x_dir=(0, -1, 0), z_dir=(1, 0, 0))) as fillet_11_piece_2:
        with BuildLine():
            CenterArc((FILLET_11_R, FILLET_11_R), FILLET_11_R, 180, 90)
            Line((0, FILLET_11_R), (0, 0))
            Line((0, 0), (FILLET_11_R, 0))
        make_face()
    extrude(amount=20, mode=Mode.SUBTRACT)

    # 草图61 → 切除-拉伸19 (cut)
    with BuildSketch(Plane(origin=(-10, 0, 0), x_dir=(0, 0, -1), z_dir=(1, 0, 0))):
        Polygon((-12, 1.0000000000000002), (-12, 5), (-10, 1.0000000000000007), align=None)
        Polygon((-13.999999999999998, 1.0000000000000002), (-13.999999999999998, 5), (-16, 0.9999999999999998), align=None)
    extrude(amount=-CUT_EXTRUDE_19_DEPTH, mode=Mode.SUBTRACT)

    # 圆角14
    fillet_14_edges = [part.edges().sort_by_distance(p)[0] for p in [
        (-10, 1.0000000000000002, 13),
    ]]
    fillet(fillet_14_edges, radius=FILLET_14_R)

    # 圆角19
    fillet_19_edges = [part.edges().sort_by_distance(p)[0] for p in [
        (-12.5, 5, 12),
        (-12.5, 5, 13.999999999999998),
    ]]
    fillet(fillet_19_edges, radius=FILLET_19_R)

    # 打孔尺寸(%根据)内六角花形沉头螺钉的类型1
    with Locations(Plane(origin=(-10, 8, 18), x_dir=(0, 0, 1), z_dir=(1, 0, 0))):
        with Locations((0, 0), (-10, 0)):
            CounterSinkHole(HOLE_WIZARD_1_D / 2, HOLE_WIZARD_1_CSINK_D / 2, depth=HOLE_WIZARD_1_DEPTH, counter_sink_angle=HOLE_WIZARD_1_CSINK_ANGLE)


solid = part.part
